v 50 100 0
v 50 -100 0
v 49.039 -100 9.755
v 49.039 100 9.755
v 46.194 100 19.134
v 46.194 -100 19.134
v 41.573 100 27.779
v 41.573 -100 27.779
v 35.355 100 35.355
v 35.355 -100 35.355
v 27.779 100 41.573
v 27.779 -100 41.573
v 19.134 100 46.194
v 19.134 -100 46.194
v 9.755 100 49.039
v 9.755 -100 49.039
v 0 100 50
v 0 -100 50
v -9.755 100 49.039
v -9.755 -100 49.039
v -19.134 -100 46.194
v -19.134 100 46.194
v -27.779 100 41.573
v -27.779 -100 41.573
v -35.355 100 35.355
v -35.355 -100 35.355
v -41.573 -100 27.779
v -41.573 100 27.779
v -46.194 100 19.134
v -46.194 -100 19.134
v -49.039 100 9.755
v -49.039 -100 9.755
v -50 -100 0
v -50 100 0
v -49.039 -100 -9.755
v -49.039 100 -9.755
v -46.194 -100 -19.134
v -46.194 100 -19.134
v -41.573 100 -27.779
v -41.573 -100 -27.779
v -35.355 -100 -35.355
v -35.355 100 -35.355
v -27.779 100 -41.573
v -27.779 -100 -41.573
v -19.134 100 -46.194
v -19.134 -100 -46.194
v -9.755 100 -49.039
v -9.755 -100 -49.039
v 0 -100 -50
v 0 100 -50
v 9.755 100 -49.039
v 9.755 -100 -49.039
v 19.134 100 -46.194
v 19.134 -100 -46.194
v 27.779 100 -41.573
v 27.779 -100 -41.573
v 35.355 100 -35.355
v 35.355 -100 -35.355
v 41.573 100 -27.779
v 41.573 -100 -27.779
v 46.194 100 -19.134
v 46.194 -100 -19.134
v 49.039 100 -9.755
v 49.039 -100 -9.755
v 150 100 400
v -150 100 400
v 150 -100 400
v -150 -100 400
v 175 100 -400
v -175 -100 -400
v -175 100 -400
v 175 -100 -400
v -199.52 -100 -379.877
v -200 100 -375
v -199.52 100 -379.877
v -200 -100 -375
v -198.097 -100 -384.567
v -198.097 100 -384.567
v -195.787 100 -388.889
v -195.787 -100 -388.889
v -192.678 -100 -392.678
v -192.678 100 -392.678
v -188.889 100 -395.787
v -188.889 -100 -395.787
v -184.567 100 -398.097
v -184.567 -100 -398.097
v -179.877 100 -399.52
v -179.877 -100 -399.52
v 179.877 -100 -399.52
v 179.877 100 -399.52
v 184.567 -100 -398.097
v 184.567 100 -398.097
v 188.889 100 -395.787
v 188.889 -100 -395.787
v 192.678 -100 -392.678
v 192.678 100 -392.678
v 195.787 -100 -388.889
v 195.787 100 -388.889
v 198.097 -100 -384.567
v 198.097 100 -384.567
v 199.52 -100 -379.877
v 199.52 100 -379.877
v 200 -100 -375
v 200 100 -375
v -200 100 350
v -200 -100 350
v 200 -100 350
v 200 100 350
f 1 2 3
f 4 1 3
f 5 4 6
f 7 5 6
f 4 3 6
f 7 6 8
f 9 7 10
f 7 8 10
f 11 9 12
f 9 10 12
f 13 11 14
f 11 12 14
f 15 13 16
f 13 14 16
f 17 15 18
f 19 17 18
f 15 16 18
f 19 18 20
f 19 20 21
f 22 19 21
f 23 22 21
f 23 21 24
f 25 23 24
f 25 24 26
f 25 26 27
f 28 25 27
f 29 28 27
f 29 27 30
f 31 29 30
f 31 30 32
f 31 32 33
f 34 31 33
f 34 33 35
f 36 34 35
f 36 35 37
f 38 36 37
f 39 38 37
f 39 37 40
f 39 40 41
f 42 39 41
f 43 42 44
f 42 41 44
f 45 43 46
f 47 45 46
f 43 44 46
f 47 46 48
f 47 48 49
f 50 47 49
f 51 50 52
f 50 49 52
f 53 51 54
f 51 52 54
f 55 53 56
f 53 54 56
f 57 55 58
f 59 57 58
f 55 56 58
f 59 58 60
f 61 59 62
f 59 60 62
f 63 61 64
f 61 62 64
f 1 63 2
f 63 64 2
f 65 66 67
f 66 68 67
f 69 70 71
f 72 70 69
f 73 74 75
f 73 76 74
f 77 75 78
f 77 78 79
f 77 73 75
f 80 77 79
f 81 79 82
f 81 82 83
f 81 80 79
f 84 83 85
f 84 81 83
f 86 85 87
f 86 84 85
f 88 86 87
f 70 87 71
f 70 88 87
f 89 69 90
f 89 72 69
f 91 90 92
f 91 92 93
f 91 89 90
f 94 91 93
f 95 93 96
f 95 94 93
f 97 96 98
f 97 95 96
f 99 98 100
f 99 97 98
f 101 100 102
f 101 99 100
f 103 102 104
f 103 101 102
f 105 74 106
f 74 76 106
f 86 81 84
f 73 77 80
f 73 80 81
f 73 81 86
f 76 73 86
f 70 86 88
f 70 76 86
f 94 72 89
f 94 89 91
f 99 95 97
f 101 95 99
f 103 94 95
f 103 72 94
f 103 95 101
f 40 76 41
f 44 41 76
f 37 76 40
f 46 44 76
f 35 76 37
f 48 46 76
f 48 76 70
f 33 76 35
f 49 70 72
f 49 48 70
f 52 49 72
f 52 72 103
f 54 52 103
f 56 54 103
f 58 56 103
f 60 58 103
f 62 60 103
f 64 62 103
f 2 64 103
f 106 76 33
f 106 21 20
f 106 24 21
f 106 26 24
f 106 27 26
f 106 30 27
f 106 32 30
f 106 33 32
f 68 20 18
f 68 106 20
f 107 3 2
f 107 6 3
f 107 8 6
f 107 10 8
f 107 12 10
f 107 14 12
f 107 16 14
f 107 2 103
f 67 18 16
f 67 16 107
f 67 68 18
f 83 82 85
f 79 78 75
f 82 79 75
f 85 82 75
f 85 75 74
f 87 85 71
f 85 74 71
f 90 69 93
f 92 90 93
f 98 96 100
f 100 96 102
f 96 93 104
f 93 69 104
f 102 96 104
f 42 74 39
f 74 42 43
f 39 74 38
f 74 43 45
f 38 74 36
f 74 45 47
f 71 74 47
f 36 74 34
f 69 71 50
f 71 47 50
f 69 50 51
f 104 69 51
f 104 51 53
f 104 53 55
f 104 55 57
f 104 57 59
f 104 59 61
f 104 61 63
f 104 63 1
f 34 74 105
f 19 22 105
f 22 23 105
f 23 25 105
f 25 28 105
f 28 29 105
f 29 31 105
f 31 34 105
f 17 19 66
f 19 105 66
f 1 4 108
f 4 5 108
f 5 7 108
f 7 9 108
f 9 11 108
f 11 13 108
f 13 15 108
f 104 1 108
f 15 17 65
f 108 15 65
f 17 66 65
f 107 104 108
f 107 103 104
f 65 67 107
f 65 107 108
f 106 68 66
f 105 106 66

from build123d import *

# Parameters (mm, degrees)
F0_W     = 400
F0_H     = 800
F1_DEPTH = 100
F2_SIZE  = 50
F3_R     = 25
F4_R     = 50
F5_DEPTH = 230


with BuildPart() as f1:
    # F0 (on Front) → F1 (new body, symmetric)
    with BuildSketch(Plane.XZ):
        Rectangle(F0_W, F0_H)
    extrude(amount=F1_DEPTH, both=True)

    # F2
    f2_edges = [f1.edges().sort_by_distance(p)[0] for p in [
        (-200, 0, 400),
        (200, 0, 400),
    ]]
    chamfer(f2_edges, length=F2_SIZE)

    # F3
    f3_edges = [f1.edges().sort_by_distance(p)[0] for p in [
        (-200, 0, -400),
        (200, 0, -400),
    ]]
    fillet(f3_edges, radius=F3_R)

    # F4 (on face) → F5 (cut)
    with BuildSketch(Plane.XZ.offset(100)):
        Circle(F4_R)
    extrude(amount=-F5_DEPTH, mode=Mode.SUBTRACT)


solid = f1.part
